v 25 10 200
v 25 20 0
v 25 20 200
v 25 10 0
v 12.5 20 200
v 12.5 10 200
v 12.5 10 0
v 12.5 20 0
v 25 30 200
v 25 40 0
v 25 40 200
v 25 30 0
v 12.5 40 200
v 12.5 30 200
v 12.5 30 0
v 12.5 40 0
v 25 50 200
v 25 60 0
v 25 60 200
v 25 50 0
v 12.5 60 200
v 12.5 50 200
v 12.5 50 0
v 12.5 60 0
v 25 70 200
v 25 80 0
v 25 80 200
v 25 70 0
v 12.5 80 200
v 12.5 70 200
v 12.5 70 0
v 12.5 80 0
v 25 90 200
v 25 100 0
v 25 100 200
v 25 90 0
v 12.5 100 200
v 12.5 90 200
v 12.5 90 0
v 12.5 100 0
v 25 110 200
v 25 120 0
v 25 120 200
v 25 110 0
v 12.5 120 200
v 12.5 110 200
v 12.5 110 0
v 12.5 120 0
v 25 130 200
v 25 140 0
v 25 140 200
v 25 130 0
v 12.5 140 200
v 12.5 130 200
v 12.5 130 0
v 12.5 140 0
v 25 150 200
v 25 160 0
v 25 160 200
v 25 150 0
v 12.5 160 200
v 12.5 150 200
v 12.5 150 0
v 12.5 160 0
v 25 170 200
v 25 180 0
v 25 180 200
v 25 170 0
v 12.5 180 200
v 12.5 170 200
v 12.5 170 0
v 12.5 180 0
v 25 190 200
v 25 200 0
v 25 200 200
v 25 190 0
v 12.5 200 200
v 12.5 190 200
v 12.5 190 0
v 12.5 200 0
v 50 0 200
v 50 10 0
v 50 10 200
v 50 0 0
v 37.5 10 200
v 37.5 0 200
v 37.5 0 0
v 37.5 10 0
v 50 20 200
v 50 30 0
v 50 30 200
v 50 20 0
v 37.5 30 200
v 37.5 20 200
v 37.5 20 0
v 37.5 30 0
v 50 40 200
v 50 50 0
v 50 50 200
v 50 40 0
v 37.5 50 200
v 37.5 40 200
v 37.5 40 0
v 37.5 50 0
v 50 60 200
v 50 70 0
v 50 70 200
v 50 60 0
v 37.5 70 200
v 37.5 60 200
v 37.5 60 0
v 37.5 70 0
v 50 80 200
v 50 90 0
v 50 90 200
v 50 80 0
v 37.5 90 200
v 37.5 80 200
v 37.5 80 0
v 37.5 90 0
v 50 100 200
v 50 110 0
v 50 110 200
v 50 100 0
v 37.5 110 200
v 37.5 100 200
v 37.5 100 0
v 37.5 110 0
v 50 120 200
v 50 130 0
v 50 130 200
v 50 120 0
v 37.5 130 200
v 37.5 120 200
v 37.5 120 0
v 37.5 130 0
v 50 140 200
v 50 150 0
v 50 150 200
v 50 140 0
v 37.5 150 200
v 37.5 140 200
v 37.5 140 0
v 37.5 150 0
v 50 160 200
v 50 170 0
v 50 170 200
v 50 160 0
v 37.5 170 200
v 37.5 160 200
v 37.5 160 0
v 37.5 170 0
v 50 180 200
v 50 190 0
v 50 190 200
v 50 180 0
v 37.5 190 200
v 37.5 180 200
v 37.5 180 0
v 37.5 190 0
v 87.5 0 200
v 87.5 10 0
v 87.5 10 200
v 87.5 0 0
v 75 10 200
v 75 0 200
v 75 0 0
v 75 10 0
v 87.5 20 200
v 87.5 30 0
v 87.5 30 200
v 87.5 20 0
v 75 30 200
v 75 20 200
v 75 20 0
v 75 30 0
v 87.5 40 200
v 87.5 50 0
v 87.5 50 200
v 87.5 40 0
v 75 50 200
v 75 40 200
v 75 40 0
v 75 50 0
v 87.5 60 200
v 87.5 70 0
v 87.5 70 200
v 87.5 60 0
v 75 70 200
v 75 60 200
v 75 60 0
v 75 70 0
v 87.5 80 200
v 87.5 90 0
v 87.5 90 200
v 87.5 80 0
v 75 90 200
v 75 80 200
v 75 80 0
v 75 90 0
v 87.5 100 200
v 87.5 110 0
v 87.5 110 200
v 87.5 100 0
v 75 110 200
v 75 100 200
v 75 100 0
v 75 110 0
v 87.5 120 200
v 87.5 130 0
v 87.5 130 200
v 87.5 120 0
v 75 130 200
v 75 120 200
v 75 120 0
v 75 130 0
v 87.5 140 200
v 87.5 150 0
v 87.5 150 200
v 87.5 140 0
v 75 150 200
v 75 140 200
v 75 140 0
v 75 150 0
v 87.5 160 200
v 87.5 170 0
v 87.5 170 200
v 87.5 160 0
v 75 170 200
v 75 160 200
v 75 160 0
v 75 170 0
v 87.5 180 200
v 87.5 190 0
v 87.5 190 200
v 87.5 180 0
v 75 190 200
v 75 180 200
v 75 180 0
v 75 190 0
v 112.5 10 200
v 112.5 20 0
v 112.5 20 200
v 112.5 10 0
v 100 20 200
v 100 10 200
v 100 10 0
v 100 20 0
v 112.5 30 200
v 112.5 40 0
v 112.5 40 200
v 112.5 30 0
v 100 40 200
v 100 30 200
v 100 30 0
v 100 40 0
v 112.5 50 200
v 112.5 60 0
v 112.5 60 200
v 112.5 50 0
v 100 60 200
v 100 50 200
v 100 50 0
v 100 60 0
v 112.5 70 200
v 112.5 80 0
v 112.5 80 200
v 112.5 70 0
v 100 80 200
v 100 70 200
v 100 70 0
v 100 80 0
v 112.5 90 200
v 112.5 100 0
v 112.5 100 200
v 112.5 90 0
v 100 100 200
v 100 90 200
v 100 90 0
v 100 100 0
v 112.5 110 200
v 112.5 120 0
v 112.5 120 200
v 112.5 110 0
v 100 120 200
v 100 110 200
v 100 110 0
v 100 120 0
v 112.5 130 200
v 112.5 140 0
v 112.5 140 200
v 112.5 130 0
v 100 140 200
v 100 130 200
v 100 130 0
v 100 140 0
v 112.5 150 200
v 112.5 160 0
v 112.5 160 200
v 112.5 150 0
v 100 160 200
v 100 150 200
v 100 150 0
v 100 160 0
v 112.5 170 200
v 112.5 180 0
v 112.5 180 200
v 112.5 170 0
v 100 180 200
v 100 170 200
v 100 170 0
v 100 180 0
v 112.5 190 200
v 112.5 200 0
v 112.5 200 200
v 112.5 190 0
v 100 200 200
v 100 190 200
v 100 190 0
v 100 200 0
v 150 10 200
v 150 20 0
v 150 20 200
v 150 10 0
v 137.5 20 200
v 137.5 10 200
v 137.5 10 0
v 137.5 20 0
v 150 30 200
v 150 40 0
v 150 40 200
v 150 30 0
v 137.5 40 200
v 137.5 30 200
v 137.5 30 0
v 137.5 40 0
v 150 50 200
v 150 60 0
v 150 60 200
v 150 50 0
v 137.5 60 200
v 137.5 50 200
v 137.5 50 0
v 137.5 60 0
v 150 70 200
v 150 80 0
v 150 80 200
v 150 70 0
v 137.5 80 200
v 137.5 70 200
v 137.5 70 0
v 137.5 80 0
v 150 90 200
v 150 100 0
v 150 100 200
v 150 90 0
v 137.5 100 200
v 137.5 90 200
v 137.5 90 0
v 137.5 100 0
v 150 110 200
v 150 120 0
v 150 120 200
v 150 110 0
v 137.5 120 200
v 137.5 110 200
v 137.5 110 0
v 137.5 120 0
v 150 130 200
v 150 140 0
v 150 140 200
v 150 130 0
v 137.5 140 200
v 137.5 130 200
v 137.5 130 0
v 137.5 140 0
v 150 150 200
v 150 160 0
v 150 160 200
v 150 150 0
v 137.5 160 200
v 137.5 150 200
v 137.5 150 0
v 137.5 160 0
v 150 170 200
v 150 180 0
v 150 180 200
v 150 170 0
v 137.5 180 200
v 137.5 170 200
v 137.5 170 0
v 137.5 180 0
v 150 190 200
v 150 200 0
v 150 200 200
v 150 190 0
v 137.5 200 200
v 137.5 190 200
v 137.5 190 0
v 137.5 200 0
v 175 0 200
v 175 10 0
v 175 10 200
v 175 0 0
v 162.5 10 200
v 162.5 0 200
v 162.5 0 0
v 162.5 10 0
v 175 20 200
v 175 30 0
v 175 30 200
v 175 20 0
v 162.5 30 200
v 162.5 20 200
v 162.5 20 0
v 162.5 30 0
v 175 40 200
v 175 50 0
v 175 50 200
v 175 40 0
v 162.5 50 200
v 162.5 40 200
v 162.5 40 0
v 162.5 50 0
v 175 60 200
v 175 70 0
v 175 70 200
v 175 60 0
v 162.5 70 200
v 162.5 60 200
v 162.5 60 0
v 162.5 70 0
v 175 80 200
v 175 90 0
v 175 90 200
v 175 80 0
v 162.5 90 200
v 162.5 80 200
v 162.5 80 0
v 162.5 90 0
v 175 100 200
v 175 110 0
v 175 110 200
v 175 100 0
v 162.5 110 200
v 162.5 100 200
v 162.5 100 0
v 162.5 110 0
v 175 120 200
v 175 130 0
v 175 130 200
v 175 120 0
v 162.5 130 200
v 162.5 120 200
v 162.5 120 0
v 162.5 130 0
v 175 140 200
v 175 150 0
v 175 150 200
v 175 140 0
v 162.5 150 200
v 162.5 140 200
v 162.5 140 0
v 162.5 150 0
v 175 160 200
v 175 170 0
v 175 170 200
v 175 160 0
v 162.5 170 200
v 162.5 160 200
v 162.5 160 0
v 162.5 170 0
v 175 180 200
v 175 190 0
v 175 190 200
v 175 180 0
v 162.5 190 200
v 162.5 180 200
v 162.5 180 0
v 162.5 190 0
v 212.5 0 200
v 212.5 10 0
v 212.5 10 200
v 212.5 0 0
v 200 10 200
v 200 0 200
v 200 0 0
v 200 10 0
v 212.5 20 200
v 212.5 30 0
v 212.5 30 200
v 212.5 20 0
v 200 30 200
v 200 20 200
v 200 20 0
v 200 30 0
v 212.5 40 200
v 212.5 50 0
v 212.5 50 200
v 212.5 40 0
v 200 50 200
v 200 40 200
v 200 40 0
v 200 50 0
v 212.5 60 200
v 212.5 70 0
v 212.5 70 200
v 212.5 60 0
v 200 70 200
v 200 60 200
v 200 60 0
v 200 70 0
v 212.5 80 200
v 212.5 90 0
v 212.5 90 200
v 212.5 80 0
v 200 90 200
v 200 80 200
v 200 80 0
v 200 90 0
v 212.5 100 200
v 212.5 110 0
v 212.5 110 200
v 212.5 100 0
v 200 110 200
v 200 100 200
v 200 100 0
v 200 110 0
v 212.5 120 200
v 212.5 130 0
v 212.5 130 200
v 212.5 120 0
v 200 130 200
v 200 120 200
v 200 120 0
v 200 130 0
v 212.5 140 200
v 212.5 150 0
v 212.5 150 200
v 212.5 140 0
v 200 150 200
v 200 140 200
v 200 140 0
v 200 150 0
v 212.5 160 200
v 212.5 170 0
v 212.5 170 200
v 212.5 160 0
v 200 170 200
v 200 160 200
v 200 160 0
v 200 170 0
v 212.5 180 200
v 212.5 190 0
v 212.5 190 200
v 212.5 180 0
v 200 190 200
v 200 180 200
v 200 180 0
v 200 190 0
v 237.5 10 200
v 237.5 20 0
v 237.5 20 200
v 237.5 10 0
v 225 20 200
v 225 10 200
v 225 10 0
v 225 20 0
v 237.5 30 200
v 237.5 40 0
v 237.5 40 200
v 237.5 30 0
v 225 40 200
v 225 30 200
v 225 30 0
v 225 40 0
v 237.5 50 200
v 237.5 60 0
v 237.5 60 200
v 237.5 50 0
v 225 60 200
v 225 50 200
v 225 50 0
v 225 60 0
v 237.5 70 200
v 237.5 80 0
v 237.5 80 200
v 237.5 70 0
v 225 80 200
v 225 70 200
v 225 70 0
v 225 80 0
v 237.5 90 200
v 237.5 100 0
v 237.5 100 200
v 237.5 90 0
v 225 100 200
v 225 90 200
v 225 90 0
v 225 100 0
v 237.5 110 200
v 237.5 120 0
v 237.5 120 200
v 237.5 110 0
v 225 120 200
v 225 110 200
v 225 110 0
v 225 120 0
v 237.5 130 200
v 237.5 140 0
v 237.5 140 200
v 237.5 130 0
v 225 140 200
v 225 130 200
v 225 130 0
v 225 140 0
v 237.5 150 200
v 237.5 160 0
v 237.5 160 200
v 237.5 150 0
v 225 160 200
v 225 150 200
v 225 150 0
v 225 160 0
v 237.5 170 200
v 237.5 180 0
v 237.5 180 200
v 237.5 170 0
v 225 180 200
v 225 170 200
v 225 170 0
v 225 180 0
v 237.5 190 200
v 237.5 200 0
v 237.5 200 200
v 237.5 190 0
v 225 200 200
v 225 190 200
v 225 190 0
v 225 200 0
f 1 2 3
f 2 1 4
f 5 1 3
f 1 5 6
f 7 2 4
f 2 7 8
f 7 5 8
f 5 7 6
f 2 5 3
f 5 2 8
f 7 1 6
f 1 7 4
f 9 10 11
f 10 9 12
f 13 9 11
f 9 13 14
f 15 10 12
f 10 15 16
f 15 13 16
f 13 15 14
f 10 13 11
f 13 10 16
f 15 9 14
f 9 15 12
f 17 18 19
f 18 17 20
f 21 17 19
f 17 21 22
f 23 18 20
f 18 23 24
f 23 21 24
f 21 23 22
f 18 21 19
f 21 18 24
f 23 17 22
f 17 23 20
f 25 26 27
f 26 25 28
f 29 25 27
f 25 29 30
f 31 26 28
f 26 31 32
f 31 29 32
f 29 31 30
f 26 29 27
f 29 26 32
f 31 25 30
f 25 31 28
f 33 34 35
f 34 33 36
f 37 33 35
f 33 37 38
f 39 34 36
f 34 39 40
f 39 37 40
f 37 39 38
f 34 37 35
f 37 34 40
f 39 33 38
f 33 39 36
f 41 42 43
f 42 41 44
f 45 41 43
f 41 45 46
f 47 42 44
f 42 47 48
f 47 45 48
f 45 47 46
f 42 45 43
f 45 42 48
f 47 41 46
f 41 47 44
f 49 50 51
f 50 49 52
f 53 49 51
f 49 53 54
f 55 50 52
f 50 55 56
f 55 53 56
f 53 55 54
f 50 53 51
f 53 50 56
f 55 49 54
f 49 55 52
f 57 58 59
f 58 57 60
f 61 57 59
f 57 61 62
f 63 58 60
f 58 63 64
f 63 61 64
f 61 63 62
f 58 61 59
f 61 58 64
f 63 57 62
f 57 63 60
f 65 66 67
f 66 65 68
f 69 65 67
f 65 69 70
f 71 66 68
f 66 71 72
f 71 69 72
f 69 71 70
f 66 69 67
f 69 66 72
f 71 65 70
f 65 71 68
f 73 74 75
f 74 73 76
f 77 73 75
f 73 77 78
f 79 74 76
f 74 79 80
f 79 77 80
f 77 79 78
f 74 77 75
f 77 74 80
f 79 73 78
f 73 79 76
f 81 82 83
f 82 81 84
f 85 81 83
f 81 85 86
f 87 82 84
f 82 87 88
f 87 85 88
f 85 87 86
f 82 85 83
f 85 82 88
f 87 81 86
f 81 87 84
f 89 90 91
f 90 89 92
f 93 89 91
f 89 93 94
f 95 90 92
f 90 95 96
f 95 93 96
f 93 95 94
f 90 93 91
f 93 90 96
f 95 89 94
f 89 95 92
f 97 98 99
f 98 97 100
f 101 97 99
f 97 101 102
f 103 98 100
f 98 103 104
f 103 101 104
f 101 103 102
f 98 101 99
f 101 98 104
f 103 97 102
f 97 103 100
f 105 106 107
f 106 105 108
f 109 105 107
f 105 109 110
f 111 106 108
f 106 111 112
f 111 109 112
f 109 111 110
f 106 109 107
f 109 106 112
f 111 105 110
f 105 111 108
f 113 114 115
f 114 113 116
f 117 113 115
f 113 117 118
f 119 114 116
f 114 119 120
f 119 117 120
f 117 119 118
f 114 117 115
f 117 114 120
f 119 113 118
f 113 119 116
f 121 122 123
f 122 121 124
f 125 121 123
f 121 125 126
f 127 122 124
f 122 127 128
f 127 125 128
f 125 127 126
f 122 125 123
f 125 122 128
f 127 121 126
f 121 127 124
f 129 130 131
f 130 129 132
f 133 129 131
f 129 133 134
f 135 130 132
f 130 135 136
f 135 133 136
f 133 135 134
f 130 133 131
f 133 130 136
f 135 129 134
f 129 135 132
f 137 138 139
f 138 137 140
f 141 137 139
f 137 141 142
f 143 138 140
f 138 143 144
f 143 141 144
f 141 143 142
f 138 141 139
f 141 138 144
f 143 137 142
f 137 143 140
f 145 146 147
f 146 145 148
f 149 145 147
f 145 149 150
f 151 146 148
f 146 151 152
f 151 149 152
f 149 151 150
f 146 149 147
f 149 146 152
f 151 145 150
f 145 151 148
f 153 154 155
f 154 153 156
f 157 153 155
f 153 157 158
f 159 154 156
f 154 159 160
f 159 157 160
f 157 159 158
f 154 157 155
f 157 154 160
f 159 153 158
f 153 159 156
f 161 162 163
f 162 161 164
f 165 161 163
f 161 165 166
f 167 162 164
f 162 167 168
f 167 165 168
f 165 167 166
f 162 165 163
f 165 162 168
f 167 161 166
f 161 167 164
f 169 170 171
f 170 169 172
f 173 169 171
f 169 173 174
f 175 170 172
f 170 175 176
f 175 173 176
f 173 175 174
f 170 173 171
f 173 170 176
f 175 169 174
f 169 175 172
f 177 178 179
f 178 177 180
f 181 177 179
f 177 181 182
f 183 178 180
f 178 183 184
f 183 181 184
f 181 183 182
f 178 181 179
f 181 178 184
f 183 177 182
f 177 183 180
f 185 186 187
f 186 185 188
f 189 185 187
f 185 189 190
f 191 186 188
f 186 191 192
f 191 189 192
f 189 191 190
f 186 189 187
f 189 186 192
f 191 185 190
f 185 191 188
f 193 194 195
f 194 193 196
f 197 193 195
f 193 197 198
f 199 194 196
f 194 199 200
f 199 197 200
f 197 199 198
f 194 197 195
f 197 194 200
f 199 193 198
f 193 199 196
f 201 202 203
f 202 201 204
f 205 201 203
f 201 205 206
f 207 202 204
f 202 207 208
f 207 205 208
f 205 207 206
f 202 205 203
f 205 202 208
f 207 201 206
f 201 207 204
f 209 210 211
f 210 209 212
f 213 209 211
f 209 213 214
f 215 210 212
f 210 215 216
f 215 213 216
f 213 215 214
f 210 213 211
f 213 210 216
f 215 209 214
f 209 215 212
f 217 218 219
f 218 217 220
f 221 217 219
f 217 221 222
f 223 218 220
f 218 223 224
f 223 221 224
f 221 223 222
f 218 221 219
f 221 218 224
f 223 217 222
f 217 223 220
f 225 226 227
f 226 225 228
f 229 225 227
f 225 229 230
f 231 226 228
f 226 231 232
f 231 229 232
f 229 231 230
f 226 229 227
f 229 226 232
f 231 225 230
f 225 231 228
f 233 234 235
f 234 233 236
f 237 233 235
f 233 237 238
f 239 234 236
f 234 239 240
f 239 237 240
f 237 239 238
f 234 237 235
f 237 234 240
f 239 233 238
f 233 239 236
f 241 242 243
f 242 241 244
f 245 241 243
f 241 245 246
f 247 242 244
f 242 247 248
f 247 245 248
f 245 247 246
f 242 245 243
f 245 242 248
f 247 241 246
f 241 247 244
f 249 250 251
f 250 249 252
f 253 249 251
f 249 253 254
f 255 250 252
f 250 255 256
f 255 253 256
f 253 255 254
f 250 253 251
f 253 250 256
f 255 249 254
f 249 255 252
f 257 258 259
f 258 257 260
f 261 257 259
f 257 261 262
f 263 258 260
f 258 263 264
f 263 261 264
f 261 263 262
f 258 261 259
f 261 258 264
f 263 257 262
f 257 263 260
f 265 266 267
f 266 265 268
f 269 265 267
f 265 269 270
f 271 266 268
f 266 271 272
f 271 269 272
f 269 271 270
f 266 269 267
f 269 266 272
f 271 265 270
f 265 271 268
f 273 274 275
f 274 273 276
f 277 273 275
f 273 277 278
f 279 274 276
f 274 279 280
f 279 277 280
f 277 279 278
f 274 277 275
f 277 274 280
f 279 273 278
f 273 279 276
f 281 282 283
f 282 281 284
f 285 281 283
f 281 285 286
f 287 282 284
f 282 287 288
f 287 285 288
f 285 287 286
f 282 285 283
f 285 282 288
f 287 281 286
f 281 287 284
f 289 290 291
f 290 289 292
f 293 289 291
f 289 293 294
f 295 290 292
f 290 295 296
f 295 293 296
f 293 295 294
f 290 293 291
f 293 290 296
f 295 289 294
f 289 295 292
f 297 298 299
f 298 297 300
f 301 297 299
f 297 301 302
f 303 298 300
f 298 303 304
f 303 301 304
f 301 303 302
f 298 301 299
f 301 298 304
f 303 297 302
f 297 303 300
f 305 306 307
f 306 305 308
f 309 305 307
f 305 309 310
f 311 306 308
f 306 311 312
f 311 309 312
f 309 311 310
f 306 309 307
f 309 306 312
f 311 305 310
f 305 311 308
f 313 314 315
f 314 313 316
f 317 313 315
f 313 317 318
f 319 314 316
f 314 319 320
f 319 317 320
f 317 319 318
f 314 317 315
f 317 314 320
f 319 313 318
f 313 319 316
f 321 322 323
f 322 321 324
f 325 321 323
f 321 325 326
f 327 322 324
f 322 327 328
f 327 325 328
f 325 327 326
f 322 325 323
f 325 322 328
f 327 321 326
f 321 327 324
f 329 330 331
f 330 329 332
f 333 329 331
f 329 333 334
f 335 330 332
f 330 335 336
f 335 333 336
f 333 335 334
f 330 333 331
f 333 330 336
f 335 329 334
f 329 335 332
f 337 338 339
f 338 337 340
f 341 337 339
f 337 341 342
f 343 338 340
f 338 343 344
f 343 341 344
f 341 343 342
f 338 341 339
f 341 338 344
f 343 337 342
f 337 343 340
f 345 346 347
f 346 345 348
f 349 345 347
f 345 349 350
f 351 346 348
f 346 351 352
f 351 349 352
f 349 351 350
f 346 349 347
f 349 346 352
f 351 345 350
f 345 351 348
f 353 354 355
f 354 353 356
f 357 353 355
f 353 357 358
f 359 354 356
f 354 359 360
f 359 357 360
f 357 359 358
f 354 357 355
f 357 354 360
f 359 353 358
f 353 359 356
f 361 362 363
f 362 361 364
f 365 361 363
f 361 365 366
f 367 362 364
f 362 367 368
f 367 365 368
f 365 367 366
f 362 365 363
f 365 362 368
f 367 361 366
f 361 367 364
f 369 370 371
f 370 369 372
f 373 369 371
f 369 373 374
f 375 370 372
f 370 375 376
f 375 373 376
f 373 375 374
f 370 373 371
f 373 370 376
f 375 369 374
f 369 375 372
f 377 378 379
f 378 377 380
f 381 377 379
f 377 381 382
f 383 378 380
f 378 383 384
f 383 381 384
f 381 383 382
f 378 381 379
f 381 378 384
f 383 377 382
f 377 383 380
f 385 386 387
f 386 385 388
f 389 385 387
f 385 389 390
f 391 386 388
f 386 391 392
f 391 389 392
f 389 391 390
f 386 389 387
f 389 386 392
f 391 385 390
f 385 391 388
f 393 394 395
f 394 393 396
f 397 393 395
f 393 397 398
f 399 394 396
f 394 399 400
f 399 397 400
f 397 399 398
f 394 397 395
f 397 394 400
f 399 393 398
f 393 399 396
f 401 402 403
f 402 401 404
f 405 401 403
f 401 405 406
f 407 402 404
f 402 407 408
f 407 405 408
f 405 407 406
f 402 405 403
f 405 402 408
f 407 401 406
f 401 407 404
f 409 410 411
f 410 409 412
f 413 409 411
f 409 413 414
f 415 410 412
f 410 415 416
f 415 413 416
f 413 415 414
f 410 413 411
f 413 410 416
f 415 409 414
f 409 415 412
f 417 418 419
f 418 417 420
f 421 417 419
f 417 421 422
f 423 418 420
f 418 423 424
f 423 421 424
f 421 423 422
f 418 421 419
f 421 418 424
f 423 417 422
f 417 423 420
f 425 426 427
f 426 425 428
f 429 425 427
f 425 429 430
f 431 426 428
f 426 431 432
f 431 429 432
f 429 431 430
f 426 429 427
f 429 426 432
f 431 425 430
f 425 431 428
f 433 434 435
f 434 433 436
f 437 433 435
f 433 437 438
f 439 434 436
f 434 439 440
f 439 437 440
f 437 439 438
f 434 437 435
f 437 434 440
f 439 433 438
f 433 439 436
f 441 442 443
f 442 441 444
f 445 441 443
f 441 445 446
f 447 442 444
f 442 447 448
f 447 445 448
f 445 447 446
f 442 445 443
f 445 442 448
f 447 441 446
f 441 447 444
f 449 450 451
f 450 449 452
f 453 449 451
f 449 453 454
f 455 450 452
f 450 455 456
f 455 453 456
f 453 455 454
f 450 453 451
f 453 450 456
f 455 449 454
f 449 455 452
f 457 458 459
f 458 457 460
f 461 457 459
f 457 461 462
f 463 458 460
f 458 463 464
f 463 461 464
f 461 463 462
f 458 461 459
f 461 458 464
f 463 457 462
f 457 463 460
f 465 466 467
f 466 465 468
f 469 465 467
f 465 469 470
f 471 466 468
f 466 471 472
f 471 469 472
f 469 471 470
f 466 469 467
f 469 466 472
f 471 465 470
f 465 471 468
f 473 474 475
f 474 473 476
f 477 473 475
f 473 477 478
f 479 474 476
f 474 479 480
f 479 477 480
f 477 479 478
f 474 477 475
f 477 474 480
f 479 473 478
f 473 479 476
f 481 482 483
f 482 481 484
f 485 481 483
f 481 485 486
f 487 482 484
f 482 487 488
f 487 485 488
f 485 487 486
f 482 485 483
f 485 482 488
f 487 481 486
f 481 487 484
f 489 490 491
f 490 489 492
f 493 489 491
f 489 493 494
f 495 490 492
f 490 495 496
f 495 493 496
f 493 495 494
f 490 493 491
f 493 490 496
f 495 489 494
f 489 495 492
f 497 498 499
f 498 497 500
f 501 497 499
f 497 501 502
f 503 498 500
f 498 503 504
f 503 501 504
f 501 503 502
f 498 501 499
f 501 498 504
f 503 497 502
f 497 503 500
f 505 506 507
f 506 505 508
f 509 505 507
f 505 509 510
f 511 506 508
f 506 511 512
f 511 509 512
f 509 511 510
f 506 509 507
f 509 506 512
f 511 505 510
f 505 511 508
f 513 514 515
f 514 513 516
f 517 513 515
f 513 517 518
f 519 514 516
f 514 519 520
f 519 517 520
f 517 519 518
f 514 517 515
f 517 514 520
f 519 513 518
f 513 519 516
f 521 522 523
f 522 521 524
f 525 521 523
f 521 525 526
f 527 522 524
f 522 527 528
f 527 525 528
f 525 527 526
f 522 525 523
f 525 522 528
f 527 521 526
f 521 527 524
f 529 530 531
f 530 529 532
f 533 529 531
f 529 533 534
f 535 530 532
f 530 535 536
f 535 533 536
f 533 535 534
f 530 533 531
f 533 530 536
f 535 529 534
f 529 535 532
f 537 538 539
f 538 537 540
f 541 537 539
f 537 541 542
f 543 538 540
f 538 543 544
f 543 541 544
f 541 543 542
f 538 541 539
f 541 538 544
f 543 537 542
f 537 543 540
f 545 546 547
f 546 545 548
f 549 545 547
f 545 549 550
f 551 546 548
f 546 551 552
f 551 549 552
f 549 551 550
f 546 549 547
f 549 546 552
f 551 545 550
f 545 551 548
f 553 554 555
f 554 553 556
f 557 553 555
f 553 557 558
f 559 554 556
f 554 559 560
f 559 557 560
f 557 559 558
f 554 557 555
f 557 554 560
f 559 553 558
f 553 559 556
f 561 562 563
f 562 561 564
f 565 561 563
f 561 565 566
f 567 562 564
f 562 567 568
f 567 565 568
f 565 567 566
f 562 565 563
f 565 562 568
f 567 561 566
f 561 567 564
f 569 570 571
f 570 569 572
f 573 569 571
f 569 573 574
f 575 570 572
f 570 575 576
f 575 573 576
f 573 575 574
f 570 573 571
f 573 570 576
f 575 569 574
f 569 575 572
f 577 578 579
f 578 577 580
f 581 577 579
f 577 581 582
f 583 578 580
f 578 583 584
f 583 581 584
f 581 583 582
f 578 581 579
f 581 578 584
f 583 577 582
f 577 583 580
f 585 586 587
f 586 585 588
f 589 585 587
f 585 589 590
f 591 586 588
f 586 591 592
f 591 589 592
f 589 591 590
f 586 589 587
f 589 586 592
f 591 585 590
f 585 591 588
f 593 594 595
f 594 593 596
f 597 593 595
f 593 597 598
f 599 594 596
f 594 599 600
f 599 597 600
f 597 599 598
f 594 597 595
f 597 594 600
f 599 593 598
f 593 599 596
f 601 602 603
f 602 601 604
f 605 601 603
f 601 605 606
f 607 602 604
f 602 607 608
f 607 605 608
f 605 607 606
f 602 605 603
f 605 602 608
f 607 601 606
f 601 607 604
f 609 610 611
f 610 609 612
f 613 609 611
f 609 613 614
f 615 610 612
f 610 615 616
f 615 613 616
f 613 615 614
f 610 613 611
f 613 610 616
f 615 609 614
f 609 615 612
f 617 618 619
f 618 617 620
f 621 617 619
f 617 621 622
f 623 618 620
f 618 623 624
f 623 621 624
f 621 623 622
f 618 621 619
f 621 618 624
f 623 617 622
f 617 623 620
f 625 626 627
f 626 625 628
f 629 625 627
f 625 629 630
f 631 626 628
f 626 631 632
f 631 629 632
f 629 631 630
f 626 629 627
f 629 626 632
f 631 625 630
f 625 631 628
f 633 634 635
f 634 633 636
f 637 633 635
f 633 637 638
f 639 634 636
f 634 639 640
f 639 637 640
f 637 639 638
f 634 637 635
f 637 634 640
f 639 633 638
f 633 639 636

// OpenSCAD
// file: pressureMap.scad
// This file is auto generated by cpp/src/pressure.cpp
// using input/pressureMap.pres

pressureMap = [
	[10, 20, 30, 40, 50, 50, 40, 30, 20, 10, 10, 20, 30, 40, 50, 50, 40, 30, 20, 10, ],
	[50, 40, 30, 20, 10, 10, 20, 30, 40, 50, 50, 40, 30, 20, 10, 10, 20, 30, 40, 50, ],
	[10, 20, 30, 40, 50, 50, 40, 30, 20, 10, 10, 20, 30, 40, 50, 50, 40, 30, 20, 10, ],
	[50, 40, 30, 20, 10, 10, 20, 30, 40, 50, 50, 40, 30, 20, 10, 10, 20, 30, 40, 50, ],
	[10, 20, 30, 40, 50, 50, 40, 30, 20, 10, 10, 20, 30, 40, 50, 50, 40, 30, 20, 10, ],
	[50, 40, 30, 20, 10, 10, 20, 30, 40, 50, 50, 40, 30, 20, 10, 10, 20, 30, 40, 50, ],
	[10, 20, 30, 40, 50, 50, 40, 30, 20, 10, 10, 20, 30, 40, 50, 50, 40, 30, 20, 10, ],
	[50, 40, 30, 20, 10, 10, 20, 30, 40, 50, 50, 40, 30, 20, 10, 10, 20, 30, 40, 50, ],
	[10, 20, 30, 40, 50, 50, 40, 30, 20, 10, 10, 20, 30, 40, 50, 50, 40, 30, 20, 10, ],
	[50, 40, 30, 20, 10, 10, 20, 30, 40, 50, 50, 40, 30, 20, 10, 10, 20, 30, 40, 50, ],
	[10, 20, 30, 40, 50, 50, 40, 30, 20, 10, 10, 20, 30, 40, 50, 50, 40, 30, 20, 10, ],
	[50, 40, 30, 20, 10, 10, 20, 30, 40, 50, 50, 40, 30, 20, 10, 10, 20, 30, 40, 50, ],
	[10, 20, 30, 40, 50, 50, 40, 30, 20, 10, 10, 20, 30, 40, 50, 50, 40, 30, 20, 10, ],
	[50, 40, 30, 20, 10, 10, 20, 30, 40, 50, 50, 40, 30, 20, 10, 10, 20, 30, 40, 50, ],
	[10, 20, 30, 40, 50, 50, 40, 30, 20, 10, 10, 20, 30, 40, 50, 50, 40, 30, 20, 10, ],
	[50, 40, 30, 20, 10, 10, 20, 30, 40, 50, 50, 40, 30, 20, 10, 10, 20, 30, 40, 50, ],
	[10, 20, 30, 40, 50, 50, 40, 30, 20, 10, 10, 20, 30, 40, 50, 50, 40, 30, 20, 10, ],
	[50, 40, 30, 20, 10, 10, 20, 30, 40, 50, 50, 40, 30, 20, 10, 10, 20, 30, 40, 50, ],
	[10, 20, 30, 40, 50, 50, 40, 30, 20, 10, 10, 20, 30, 40, 50, 50, 40, 30, 20, 10, ],
	[50, 40, 30, 20, 10, 10, 20, 30, 40, 50, 50, 40, 30, 20, 10, 10, 20, 30, 40, 50, ],
];

pressureMapNumRow = 20;
pressureMapNumCol = 20;
// file: param.scad
// This file is auto generated by cpp/src/main.cpp
// using user input

padLength = 200;
padWidth = 250;
padHeight = 100;
// main file
// @file        modMeshGen.scad
// @author      Alex Wong Tat Hang
// @brief       modifier mesh generation scad script
// @note        loThres and hiThres should be used as parameters
// @warning     param.scad and pressureMap.scad must be created before this script is called
// @date        28/4/2019
// @copyright   Copyright (c) 2019

include <param.scad>;
include <pressureMap.scad>;

loThrs = 40;
hiThrs = 50;

spacingX = padWidth / pressureMapNumCol;
spacingY = padLength / pressureMapNumRow;

for (i = [0:pressureMapNumCol - 1]) {
    for (j = [0:pressureMapNumRow - 1]) {
        if((pressureMap[j][i] >= loThrs) && (pressureMap[j][i] < hiThrs))
            translate([i * spacingX, j * spacingY, 0]) {
                cube([spacingX, spacingY, padHeight * 2], false);
        }        
    }
}
